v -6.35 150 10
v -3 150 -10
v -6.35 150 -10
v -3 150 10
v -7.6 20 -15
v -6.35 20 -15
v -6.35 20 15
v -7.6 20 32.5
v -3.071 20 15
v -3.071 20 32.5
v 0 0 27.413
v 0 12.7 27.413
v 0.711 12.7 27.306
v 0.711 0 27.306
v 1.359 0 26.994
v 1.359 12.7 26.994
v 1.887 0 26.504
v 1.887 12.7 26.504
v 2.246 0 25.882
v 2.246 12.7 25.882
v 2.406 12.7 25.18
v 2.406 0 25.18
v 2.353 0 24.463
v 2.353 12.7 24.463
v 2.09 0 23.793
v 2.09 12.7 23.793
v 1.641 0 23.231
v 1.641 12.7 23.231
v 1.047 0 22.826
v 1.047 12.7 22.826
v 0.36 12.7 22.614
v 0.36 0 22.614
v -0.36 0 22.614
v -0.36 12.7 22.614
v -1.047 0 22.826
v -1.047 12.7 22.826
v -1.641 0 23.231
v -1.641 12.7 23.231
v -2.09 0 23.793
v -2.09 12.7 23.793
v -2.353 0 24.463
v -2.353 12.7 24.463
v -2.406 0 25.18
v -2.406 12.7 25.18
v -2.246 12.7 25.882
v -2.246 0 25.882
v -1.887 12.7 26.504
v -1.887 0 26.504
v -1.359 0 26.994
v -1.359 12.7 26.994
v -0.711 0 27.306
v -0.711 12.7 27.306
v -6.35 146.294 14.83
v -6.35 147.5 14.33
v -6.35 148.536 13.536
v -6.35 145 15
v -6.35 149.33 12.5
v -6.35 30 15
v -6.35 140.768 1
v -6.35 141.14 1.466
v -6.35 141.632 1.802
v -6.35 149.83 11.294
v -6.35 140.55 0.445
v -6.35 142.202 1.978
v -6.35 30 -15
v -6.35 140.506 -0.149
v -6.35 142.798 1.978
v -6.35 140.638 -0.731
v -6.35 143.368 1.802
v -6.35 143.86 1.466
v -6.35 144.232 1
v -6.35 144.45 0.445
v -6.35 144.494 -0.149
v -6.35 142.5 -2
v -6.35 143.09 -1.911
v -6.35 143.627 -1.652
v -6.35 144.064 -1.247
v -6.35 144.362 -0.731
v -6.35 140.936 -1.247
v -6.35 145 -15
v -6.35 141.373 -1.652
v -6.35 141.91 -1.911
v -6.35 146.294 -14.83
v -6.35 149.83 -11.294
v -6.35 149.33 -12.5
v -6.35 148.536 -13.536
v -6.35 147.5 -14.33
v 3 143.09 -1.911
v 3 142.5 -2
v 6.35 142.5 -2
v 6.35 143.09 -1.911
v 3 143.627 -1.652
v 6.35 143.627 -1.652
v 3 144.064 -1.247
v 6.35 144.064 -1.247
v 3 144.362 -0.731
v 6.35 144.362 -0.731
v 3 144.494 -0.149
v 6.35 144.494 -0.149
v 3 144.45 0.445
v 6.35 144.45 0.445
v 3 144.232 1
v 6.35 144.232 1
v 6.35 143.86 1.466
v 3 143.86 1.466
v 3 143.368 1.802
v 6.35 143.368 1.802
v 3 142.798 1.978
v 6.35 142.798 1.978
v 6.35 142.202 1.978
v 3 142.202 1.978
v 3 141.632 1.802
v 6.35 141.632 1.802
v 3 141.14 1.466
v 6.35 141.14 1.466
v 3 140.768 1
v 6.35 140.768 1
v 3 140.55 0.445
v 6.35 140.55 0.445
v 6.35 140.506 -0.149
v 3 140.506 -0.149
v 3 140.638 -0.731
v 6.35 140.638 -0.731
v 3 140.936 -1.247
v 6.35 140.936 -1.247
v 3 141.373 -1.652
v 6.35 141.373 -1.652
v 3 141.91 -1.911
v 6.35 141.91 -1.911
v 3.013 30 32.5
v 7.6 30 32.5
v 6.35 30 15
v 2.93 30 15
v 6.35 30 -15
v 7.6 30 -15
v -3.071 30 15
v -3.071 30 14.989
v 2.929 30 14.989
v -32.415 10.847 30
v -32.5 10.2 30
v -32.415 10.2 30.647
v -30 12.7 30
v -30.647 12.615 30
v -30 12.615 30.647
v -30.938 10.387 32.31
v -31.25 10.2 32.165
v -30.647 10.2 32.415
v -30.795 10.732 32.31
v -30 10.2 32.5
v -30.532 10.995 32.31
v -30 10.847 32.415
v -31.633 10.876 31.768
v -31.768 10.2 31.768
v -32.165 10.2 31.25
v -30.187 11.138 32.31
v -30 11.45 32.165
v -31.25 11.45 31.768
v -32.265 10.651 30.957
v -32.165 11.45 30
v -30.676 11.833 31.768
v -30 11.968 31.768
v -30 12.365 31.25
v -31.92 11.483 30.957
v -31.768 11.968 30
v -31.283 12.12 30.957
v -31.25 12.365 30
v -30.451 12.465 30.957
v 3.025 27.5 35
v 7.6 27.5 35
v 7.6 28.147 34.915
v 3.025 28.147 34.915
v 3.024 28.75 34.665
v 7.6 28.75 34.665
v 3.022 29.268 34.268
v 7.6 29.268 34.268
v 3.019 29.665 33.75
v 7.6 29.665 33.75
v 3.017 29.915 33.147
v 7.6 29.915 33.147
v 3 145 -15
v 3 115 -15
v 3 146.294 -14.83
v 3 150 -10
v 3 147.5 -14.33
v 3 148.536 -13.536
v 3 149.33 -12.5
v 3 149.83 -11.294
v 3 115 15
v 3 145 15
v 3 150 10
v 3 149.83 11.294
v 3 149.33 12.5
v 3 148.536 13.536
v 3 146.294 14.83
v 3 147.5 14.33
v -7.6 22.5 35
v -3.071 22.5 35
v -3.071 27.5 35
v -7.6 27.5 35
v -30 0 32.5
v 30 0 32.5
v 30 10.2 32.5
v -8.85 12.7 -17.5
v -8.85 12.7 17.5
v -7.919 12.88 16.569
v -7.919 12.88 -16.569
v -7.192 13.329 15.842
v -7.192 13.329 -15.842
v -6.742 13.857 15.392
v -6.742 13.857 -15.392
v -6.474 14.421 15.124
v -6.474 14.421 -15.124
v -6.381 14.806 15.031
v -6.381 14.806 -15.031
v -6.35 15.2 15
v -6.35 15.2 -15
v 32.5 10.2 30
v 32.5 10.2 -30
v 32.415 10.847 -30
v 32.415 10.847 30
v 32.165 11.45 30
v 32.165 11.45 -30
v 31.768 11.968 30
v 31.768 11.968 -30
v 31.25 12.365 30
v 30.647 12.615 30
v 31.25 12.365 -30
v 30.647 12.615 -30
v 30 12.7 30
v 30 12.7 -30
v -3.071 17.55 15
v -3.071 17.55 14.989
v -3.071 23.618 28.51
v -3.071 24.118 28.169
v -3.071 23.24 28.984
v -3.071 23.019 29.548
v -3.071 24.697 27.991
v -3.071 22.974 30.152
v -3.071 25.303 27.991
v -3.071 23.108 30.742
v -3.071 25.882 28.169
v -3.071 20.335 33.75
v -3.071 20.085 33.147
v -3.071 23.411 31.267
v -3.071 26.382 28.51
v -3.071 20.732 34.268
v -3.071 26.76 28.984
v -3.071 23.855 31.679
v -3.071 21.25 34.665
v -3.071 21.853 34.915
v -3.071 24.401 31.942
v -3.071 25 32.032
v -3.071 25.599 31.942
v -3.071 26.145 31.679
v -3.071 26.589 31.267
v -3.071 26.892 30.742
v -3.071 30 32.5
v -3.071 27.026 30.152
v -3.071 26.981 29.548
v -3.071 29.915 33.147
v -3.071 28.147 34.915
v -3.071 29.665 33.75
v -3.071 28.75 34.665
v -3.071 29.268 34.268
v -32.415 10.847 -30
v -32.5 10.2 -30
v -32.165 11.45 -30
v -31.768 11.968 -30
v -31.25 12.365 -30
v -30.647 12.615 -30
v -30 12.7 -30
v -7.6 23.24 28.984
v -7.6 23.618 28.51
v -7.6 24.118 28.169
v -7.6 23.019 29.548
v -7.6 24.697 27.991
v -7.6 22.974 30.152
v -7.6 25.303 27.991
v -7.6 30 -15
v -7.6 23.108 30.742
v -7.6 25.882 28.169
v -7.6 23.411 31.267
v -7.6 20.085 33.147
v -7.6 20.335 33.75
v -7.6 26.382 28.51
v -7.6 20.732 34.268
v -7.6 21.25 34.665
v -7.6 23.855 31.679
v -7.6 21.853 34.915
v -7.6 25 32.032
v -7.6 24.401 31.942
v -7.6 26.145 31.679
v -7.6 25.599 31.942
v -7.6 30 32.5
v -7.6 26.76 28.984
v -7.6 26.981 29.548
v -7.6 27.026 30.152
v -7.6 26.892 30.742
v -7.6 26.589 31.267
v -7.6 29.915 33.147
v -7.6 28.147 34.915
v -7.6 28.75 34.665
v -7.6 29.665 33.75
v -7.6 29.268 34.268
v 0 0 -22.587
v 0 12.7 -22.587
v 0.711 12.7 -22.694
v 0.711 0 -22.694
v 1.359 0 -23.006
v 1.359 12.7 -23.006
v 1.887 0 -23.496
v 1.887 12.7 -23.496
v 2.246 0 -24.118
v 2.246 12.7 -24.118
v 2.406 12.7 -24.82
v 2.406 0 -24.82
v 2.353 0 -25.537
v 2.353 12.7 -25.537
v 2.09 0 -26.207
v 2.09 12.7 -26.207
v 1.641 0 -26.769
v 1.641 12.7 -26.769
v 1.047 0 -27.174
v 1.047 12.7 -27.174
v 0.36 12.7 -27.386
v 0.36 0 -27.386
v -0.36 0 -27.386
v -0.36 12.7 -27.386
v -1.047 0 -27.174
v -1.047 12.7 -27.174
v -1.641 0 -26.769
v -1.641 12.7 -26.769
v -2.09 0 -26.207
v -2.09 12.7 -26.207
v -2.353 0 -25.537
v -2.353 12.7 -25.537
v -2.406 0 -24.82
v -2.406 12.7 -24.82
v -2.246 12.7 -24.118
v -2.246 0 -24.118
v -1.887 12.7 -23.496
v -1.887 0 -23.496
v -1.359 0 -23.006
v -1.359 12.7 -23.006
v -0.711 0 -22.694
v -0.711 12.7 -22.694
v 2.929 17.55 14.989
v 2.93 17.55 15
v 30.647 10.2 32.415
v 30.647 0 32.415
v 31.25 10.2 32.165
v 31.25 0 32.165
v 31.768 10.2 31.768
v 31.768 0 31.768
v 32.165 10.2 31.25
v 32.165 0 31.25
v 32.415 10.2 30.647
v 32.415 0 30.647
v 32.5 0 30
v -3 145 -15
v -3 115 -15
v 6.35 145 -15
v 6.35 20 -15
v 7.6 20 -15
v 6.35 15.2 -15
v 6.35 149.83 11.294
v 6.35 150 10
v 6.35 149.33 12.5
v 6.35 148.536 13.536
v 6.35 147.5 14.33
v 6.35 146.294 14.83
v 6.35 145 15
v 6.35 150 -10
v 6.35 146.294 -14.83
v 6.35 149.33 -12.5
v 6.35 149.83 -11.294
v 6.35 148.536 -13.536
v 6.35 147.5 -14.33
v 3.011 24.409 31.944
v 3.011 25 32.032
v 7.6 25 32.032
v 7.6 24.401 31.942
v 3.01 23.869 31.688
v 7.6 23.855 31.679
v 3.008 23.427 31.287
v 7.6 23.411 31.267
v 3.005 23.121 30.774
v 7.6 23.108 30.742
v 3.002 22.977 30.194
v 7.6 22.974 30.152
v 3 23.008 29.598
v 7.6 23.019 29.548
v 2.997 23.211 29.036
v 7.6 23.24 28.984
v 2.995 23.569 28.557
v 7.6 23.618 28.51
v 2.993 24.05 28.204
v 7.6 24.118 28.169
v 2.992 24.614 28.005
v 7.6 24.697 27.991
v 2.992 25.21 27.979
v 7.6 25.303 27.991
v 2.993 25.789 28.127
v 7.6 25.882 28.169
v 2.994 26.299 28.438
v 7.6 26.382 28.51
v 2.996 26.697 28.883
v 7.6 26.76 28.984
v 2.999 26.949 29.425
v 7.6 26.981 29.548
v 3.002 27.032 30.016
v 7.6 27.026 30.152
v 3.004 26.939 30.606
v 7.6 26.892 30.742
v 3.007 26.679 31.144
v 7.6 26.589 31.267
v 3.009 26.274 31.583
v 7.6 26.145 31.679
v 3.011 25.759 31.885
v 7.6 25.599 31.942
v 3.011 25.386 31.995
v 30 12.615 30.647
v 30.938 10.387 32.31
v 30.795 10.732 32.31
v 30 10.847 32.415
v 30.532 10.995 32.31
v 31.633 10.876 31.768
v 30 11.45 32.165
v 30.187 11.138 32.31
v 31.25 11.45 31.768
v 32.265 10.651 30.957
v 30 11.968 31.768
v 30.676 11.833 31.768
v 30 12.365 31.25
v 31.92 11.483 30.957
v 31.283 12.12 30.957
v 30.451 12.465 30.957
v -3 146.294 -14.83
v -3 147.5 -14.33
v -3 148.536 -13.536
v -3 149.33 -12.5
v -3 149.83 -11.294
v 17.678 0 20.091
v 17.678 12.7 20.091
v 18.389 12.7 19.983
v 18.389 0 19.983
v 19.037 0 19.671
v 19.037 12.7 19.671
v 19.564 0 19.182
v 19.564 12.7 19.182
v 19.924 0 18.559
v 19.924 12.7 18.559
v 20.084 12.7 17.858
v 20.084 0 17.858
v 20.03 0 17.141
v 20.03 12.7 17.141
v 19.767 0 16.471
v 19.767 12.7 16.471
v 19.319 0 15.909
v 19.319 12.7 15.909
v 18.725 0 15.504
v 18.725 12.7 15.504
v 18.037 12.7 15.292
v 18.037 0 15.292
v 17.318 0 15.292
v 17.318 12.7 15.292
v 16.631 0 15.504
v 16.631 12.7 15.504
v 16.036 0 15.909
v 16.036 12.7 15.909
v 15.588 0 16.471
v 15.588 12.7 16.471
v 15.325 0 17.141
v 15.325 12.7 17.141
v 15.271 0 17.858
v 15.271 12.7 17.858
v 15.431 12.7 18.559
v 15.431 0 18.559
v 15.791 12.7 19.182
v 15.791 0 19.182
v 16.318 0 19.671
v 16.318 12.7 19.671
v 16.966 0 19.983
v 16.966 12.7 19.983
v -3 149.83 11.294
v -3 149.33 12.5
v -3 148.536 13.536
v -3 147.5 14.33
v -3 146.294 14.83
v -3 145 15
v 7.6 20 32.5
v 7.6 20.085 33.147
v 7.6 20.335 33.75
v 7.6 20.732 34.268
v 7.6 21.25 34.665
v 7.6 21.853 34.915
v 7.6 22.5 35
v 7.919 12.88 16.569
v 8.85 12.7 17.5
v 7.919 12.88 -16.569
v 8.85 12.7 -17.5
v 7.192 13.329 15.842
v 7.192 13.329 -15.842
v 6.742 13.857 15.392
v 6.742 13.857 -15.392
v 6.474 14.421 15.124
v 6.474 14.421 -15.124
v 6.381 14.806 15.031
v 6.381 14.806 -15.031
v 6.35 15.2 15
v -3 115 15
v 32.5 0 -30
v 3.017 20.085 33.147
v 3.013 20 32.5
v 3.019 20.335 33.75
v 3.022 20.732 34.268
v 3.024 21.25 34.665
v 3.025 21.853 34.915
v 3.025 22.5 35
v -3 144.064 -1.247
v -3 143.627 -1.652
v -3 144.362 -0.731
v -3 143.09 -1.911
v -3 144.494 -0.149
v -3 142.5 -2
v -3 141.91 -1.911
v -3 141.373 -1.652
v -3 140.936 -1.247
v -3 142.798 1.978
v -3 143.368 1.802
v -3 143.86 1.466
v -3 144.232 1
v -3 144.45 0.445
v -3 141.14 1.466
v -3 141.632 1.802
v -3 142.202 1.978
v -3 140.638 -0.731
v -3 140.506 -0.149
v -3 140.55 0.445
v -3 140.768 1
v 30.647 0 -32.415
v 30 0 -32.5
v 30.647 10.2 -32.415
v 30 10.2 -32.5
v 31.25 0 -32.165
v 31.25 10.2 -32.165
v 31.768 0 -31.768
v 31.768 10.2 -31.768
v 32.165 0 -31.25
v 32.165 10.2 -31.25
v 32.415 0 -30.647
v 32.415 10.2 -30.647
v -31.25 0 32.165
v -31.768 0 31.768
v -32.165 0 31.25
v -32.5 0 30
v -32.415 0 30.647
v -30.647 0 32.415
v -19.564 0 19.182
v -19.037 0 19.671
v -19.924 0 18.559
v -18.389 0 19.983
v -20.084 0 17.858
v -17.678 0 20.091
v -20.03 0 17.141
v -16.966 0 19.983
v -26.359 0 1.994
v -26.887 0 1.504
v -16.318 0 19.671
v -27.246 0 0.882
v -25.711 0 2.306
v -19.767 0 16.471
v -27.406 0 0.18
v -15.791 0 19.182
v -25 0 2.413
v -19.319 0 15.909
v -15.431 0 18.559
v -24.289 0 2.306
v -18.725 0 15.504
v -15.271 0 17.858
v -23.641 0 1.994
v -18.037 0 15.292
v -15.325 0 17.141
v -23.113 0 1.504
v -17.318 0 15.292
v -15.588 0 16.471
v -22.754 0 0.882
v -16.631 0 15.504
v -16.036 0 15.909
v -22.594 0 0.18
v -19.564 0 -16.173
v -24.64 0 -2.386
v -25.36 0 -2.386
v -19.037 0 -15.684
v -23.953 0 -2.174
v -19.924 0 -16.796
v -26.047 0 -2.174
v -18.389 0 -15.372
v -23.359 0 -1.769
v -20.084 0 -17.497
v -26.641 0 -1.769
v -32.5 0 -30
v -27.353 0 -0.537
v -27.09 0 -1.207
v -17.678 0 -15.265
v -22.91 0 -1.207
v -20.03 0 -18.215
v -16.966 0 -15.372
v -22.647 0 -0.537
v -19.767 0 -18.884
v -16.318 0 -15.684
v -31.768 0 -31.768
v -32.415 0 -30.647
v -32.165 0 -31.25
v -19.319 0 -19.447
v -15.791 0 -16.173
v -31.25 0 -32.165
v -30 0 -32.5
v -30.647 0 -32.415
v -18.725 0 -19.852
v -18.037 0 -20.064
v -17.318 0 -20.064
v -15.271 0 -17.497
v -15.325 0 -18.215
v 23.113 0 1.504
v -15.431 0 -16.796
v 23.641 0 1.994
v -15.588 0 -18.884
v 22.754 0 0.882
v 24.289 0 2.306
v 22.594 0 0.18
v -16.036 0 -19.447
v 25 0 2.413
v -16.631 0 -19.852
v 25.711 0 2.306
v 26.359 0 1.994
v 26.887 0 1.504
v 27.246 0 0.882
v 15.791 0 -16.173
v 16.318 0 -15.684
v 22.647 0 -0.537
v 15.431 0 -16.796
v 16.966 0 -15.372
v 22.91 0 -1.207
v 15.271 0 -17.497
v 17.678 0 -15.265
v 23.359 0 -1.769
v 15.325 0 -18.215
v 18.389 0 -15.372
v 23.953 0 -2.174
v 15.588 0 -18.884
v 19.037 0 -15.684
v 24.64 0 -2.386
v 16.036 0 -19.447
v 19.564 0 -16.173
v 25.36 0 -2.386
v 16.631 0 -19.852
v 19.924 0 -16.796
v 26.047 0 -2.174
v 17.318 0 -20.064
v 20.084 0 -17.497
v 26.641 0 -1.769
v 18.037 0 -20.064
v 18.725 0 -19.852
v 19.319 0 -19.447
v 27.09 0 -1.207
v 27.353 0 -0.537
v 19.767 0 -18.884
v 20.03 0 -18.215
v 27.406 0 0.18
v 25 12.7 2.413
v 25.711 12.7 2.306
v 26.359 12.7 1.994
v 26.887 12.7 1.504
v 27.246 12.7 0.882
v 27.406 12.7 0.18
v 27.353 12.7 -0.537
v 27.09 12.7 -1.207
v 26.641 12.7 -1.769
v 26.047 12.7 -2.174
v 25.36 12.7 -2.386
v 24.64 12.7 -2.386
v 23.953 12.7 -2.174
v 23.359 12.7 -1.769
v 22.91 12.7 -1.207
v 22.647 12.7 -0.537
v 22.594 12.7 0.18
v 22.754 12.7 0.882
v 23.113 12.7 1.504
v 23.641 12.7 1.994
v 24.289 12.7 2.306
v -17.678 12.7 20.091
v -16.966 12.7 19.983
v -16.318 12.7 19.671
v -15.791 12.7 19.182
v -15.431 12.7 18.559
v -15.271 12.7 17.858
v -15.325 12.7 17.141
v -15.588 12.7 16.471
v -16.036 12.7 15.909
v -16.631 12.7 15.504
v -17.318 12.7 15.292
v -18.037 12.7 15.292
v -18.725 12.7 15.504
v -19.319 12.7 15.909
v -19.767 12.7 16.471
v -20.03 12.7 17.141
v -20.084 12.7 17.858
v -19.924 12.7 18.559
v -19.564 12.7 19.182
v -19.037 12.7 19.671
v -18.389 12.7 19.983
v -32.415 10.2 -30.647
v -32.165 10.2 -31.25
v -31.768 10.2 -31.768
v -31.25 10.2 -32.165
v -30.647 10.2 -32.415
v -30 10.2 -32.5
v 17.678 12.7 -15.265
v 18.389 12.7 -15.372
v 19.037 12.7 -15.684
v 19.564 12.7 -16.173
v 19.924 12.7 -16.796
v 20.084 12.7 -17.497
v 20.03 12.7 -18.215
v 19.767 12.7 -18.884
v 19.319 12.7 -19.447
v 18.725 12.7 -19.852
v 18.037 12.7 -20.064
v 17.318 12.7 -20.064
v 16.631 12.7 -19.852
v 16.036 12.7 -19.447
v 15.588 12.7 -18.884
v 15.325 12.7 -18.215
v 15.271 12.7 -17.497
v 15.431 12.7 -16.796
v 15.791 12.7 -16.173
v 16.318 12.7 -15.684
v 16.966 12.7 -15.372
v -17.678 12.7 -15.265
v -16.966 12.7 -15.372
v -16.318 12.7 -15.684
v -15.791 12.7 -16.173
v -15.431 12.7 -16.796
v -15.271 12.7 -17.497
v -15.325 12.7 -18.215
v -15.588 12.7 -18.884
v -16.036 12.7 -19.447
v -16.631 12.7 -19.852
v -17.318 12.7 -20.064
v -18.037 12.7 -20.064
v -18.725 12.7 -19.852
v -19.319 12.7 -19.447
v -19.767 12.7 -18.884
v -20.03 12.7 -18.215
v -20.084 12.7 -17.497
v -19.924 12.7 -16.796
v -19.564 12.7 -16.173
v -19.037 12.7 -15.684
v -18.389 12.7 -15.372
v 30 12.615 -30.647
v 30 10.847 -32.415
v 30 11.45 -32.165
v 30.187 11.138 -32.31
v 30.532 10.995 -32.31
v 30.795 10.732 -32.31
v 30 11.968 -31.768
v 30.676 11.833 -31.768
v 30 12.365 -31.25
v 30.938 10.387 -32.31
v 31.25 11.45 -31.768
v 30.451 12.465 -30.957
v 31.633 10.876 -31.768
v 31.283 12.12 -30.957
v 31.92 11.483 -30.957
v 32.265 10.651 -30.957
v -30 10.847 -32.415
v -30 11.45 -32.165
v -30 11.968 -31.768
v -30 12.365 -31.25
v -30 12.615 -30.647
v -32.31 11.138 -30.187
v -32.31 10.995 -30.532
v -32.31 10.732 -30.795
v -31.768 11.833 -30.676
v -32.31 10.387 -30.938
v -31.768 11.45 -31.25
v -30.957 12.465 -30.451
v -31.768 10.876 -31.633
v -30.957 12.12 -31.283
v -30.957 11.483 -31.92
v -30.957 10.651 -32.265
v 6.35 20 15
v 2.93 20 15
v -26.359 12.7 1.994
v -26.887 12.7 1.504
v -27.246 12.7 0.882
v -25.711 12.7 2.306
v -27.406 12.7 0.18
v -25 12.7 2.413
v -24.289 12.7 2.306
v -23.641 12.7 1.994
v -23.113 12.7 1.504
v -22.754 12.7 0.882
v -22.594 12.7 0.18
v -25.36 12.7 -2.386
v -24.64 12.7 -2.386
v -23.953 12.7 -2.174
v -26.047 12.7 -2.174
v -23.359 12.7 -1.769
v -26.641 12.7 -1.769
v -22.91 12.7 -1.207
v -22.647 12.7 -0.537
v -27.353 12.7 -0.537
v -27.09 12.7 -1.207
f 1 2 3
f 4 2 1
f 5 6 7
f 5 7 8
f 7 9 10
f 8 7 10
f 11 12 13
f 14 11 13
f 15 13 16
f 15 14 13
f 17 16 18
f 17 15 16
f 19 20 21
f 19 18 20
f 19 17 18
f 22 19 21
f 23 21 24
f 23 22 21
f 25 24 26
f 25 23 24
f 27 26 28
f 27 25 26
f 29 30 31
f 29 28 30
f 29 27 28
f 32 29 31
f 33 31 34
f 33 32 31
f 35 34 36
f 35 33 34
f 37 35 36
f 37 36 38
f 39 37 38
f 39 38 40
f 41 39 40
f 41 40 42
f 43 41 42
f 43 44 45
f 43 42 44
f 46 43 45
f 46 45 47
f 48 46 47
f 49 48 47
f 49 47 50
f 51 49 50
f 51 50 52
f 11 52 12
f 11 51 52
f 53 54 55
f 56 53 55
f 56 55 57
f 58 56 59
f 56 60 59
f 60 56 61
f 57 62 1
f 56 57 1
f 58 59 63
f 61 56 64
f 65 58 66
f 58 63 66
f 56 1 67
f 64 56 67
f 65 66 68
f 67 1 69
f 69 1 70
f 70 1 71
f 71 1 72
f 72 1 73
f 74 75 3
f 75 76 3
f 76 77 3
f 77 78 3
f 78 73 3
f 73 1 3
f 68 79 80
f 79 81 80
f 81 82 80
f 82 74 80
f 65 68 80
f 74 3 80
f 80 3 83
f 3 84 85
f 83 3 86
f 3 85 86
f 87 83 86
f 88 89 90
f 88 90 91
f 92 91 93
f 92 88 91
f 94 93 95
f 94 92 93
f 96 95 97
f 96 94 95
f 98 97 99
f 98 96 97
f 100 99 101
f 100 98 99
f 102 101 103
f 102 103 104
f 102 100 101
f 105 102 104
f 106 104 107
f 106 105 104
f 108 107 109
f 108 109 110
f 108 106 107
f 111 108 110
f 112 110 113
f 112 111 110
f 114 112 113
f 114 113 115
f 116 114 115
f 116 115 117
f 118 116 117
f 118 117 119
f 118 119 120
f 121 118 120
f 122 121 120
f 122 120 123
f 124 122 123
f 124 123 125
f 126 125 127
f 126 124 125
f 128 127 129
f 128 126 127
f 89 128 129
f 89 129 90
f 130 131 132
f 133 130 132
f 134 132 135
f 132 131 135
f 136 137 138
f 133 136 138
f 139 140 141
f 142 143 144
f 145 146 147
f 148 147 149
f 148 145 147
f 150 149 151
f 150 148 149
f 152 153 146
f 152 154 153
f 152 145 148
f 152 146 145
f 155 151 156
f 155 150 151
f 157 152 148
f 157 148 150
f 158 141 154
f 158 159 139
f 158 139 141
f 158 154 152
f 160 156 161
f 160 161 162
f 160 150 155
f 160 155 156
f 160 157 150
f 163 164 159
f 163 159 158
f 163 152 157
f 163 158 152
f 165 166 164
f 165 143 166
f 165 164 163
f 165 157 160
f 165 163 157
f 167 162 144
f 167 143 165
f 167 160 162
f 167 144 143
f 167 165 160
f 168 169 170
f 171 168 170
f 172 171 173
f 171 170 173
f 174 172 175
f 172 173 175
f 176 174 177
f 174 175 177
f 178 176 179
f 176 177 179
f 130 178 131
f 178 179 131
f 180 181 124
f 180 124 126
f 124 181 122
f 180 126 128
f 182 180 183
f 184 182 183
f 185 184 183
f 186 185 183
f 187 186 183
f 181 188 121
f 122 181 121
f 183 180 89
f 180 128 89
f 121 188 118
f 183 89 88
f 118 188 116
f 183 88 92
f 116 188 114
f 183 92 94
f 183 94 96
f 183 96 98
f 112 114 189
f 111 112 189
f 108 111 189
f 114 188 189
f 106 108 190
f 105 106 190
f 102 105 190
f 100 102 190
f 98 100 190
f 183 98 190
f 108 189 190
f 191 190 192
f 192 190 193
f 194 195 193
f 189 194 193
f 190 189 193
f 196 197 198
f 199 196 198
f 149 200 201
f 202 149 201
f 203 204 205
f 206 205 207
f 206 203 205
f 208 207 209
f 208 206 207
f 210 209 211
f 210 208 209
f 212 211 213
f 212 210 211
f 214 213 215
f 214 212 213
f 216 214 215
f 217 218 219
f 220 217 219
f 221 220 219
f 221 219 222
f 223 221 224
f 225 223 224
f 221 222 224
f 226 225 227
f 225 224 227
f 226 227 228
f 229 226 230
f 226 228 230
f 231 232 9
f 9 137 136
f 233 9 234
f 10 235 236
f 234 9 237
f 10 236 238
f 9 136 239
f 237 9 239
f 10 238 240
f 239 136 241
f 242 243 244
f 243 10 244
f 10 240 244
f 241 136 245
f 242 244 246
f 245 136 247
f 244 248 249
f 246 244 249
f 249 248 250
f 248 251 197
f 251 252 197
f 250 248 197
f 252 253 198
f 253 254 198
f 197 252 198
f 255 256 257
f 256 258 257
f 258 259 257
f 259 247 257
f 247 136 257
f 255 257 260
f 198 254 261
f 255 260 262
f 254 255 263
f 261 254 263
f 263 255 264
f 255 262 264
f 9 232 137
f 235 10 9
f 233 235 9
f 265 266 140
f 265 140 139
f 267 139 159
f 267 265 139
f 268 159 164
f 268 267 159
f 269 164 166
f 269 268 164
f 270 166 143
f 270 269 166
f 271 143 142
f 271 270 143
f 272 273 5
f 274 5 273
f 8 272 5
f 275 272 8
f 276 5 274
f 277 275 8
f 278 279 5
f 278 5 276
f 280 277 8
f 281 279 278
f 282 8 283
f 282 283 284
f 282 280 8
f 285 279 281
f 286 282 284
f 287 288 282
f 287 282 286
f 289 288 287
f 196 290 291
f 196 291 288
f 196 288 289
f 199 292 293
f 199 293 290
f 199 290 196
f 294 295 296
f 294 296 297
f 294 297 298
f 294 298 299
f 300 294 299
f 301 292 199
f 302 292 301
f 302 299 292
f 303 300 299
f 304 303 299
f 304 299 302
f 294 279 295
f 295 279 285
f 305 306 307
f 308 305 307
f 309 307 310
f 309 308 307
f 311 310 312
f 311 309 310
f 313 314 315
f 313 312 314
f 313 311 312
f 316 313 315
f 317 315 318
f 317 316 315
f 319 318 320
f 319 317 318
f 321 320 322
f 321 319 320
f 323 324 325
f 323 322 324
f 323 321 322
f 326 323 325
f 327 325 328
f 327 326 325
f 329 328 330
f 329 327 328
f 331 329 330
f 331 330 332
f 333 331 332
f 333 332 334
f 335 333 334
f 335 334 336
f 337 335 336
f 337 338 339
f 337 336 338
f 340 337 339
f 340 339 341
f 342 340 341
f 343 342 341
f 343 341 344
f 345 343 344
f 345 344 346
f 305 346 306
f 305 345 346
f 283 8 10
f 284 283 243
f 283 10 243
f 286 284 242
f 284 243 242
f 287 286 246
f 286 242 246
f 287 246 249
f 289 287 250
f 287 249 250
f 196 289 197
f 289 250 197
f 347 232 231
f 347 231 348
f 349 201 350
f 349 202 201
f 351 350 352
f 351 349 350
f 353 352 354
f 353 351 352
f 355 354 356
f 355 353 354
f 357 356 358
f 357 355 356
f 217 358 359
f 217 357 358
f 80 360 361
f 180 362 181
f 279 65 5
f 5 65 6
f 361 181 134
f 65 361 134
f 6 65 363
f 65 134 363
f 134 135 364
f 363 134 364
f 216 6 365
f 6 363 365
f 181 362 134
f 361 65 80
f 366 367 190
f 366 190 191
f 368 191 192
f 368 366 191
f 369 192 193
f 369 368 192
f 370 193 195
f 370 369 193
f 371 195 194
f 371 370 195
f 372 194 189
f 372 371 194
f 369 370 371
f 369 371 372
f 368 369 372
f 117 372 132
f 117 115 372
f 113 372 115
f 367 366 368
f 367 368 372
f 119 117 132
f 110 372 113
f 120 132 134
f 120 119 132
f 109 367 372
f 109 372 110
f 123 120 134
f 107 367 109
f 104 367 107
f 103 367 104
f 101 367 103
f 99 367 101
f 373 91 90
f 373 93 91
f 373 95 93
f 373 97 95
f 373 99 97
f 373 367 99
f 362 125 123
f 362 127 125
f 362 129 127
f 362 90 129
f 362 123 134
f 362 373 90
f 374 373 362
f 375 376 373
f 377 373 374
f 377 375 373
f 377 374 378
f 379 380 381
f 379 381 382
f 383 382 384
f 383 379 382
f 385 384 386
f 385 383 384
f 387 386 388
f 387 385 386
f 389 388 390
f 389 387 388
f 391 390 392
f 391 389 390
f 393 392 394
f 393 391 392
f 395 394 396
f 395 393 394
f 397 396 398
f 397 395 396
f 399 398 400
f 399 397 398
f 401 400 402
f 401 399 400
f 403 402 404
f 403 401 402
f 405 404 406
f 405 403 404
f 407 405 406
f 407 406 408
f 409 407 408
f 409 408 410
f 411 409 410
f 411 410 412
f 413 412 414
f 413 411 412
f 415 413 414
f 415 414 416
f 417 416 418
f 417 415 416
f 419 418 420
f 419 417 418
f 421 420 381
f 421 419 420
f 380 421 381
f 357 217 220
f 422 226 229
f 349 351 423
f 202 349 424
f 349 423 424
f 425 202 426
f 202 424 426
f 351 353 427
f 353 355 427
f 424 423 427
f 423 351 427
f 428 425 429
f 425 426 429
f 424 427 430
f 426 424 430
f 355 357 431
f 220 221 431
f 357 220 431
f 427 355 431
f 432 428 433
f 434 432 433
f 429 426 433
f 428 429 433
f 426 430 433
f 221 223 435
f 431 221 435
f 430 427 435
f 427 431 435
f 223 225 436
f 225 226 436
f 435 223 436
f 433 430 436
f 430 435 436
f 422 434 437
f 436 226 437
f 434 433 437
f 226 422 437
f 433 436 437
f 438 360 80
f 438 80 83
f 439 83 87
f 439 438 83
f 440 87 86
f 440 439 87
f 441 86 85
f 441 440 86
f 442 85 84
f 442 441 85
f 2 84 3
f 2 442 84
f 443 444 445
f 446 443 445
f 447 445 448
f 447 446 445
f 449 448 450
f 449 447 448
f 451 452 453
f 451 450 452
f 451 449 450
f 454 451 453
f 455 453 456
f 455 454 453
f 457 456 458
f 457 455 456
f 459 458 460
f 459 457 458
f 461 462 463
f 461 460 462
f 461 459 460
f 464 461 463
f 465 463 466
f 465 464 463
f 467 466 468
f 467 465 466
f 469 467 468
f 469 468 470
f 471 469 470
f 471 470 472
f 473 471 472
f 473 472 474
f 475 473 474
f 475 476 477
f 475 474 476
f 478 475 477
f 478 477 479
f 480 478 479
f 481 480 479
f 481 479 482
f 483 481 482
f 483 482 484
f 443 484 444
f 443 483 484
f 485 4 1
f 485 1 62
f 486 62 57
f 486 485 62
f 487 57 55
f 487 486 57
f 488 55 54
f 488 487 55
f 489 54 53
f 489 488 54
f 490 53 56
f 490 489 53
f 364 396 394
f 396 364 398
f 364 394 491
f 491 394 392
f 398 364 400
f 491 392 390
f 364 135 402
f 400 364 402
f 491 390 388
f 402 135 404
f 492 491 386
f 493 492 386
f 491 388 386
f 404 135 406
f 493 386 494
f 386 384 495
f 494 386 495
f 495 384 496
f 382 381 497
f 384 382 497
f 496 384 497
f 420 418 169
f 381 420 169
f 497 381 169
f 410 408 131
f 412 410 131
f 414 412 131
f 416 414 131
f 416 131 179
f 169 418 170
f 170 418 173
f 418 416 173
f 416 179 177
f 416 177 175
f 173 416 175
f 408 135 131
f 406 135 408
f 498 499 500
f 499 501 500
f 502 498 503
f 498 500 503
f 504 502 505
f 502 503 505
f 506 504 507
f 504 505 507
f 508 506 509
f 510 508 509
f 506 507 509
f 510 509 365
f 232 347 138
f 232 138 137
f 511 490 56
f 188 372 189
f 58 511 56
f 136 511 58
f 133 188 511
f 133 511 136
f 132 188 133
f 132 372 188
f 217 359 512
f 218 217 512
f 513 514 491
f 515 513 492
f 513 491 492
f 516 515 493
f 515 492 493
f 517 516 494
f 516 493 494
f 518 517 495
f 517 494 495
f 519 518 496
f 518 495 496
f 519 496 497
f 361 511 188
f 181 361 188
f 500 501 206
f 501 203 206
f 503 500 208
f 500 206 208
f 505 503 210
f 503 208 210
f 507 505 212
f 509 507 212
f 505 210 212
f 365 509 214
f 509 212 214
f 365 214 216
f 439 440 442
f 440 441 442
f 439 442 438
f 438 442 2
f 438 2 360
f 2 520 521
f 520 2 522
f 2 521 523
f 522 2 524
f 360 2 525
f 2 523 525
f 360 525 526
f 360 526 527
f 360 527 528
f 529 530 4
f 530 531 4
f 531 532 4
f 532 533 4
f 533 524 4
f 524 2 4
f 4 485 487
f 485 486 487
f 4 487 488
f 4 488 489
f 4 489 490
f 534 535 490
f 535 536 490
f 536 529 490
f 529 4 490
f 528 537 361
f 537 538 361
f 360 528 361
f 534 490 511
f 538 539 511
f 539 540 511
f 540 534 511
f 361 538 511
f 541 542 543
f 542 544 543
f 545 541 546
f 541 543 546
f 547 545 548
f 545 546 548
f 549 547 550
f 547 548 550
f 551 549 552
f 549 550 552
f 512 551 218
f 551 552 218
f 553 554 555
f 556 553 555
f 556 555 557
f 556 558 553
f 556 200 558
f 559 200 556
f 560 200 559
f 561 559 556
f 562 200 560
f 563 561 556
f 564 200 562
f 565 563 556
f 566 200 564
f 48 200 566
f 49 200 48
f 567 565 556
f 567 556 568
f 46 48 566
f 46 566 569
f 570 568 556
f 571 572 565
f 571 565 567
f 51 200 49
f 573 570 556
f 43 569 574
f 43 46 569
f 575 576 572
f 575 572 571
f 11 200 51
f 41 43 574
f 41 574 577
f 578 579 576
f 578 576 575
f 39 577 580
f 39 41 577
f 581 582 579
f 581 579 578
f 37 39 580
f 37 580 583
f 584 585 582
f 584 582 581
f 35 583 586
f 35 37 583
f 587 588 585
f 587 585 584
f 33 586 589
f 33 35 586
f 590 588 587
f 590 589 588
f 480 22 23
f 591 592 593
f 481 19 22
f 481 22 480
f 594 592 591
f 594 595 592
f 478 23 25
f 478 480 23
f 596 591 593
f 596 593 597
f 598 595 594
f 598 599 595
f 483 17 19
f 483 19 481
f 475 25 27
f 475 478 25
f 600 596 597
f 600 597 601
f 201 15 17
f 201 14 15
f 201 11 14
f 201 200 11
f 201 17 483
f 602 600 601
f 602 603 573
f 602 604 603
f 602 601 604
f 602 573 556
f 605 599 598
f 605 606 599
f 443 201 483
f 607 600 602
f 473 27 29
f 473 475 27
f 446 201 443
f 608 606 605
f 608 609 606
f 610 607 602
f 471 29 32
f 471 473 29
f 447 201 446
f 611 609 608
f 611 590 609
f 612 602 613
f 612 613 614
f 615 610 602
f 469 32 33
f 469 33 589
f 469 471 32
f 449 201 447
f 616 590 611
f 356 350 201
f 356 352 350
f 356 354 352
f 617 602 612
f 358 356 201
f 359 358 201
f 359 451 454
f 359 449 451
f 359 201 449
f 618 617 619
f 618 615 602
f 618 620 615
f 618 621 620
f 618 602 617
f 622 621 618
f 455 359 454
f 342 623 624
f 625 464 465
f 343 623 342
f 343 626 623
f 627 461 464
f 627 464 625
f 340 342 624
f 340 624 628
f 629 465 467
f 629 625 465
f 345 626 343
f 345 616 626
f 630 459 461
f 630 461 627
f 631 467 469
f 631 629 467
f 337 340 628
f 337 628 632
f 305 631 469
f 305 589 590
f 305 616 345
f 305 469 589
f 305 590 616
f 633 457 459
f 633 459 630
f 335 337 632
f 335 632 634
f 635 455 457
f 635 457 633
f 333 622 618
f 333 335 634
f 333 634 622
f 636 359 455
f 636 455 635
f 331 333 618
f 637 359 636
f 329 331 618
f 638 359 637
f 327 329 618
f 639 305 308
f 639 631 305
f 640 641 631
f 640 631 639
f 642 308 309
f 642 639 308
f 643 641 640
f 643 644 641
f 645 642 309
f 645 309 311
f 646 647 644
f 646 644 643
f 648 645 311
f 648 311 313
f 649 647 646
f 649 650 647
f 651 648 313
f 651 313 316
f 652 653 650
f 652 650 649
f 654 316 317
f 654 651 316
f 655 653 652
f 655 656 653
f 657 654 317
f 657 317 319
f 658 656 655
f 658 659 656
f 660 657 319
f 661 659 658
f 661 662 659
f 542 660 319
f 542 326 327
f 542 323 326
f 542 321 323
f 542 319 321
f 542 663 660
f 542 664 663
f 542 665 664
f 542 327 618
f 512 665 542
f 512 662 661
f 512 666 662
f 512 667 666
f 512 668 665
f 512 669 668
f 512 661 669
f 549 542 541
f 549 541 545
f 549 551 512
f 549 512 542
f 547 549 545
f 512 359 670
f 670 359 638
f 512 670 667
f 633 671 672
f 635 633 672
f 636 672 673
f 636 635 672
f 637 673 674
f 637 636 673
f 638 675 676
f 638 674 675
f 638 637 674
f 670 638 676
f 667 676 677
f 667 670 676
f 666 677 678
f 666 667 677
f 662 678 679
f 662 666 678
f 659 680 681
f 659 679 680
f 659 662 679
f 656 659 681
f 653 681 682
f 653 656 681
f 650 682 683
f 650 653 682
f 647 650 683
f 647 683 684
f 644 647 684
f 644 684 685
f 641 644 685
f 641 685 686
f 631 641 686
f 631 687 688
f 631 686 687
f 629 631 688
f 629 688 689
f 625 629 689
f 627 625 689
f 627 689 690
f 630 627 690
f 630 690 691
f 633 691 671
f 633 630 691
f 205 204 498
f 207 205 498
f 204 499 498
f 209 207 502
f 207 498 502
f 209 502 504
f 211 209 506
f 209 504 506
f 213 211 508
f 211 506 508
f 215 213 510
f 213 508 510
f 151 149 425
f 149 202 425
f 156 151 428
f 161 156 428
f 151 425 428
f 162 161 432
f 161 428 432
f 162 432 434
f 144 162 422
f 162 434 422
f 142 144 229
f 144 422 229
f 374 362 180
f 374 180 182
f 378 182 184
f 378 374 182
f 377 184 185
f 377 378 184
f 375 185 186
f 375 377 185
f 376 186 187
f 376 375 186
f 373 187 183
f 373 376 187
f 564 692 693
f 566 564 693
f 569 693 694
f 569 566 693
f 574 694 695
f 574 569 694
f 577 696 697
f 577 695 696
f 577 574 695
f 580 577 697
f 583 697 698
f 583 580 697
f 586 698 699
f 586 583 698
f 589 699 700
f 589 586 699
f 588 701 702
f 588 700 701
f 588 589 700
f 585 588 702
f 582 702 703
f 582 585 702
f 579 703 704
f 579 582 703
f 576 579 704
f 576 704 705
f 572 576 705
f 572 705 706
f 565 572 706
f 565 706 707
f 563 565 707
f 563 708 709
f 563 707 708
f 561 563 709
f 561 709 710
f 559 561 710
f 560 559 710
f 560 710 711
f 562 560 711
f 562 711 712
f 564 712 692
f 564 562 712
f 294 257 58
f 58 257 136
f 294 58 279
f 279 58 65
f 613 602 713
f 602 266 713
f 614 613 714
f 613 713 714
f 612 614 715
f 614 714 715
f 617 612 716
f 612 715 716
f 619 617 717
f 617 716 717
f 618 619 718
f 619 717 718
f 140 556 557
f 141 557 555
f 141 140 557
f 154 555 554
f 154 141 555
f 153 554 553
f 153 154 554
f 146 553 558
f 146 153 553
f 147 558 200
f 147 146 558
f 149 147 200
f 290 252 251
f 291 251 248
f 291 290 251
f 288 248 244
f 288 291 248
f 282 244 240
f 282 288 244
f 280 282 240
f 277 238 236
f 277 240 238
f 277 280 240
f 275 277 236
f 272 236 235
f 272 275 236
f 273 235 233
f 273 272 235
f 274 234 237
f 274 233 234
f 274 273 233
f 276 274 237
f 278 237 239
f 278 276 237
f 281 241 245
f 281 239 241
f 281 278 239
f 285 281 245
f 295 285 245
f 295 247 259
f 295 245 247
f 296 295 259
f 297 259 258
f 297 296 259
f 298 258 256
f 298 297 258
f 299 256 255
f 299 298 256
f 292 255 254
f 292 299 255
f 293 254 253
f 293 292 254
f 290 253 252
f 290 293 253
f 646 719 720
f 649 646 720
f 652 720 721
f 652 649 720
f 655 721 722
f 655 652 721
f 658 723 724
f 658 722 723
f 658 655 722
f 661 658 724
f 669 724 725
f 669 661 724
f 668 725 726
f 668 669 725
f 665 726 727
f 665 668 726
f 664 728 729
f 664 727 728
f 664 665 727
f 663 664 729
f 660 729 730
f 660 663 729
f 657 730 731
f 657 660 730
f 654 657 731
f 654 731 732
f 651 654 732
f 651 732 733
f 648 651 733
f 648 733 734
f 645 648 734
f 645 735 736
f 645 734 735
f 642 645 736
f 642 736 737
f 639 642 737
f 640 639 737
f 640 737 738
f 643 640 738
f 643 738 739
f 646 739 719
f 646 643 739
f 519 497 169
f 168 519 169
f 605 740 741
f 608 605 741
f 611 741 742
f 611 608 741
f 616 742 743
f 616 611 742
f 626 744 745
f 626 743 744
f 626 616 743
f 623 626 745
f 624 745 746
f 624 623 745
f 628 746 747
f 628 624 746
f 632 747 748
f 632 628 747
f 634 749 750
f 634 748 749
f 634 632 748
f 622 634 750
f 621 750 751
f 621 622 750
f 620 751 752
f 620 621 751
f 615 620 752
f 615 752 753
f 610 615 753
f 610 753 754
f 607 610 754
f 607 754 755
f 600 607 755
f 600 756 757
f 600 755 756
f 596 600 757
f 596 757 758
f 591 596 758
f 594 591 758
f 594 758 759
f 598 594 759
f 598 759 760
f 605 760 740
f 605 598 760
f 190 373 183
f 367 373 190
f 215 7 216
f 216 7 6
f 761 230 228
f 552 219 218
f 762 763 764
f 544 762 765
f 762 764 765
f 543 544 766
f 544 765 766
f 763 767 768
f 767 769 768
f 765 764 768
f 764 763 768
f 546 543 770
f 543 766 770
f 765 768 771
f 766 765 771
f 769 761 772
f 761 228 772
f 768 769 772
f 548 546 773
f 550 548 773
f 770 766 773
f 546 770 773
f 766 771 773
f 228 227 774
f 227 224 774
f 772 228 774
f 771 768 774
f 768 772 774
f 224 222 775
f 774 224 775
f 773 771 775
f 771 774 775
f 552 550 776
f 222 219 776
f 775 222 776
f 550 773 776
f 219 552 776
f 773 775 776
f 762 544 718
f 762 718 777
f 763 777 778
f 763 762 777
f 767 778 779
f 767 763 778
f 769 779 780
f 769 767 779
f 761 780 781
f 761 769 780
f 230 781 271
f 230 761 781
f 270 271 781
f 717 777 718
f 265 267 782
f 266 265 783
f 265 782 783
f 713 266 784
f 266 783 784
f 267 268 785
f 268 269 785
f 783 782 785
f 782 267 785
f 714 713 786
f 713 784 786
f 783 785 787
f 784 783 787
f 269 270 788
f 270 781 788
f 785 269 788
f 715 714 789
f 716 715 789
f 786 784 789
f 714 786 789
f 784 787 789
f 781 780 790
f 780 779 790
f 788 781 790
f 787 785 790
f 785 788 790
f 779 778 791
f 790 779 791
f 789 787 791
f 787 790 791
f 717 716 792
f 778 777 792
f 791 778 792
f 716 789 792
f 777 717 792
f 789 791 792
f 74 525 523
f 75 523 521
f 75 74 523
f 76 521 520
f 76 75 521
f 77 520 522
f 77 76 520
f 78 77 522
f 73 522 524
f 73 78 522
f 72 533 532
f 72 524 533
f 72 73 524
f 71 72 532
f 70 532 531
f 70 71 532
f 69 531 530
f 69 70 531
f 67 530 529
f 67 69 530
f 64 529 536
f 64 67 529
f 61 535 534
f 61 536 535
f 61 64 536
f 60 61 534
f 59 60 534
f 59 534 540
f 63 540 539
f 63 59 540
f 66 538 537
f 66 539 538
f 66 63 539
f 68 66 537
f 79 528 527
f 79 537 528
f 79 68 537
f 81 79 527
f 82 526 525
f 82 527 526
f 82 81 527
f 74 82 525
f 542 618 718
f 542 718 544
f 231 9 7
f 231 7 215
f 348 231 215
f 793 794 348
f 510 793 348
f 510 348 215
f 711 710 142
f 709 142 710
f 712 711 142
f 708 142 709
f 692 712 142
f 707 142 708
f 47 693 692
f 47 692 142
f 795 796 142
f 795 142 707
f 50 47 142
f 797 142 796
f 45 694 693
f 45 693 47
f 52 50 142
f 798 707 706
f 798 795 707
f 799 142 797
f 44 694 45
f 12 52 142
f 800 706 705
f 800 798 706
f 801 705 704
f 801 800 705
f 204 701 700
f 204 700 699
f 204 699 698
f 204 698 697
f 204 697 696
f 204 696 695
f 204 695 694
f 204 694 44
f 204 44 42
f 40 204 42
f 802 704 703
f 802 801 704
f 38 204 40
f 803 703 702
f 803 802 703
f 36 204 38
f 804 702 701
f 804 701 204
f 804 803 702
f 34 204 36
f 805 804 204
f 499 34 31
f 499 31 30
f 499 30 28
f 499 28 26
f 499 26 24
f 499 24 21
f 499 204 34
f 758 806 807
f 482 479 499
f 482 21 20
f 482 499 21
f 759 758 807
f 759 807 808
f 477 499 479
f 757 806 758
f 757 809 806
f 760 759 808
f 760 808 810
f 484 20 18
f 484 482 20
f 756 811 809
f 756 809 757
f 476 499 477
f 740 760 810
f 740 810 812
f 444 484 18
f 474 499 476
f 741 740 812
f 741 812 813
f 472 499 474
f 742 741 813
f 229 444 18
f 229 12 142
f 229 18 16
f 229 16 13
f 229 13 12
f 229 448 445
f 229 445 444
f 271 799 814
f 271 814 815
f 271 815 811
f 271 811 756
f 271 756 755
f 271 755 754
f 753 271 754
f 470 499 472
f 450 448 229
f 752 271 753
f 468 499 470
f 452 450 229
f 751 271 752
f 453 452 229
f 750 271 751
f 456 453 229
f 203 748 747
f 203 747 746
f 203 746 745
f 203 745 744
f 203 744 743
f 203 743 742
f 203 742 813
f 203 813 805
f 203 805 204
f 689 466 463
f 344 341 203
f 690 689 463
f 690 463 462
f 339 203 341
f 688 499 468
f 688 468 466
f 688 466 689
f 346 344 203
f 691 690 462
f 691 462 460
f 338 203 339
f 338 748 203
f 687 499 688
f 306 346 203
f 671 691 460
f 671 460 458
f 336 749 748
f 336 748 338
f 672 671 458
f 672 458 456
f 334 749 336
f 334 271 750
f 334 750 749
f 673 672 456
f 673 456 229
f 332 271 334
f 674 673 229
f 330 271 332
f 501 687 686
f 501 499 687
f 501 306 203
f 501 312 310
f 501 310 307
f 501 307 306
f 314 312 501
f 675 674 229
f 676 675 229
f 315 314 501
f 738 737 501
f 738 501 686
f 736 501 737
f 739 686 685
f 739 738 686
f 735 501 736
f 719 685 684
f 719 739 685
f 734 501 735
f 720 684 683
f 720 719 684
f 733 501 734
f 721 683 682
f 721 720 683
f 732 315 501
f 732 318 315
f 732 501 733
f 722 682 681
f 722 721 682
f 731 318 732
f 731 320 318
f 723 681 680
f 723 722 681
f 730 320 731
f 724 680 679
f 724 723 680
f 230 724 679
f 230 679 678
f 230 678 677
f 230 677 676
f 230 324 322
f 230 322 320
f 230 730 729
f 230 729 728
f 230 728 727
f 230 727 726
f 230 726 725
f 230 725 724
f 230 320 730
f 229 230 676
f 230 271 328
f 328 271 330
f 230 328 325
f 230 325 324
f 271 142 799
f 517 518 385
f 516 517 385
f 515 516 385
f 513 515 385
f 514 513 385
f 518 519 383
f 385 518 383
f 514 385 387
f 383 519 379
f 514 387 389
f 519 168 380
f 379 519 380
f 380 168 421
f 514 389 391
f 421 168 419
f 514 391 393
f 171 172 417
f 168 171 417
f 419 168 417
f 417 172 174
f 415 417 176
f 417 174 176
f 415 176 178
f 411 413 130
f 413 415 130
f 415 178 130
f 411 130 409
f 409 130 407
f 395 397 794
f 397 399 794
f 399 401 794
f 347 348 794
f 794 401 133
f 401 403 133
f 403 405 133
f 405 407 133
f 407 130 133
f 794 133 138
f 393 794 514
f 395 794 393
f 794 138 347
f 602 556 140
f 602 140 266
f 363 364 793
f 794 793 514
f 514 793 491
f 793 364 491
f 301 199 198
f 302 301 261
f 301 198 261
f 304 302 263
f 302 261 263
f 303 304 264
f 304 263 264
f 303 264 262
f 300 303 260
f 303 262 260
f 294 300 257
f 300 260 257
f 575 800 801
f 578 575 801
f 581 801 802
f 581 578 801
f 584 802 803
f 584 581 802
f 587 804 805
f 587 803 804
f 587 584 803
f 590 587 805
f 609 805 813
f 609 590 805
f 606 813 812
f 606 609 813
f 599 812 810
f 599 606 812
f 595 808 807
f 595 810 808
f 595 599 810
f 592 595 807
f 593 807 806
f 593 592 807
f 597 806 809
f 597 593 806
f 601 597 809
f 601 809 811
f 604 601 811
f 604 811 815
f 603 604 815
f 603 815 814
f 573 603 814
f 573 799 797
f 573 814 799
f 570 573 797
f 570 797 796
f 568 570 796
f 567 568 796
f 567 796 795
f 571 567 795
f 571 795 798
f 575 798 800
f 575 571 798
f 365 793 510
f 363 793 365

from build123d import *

# Parameters (mm, degrees)
SKETCH1_W               = 65
SKETCH1_H               = 65
BOSS_EXTRUDE1_DEPTH     = 12.7
SKETCH2_R               = 2
BOSS_EXTRUDE2_DEPTH     = 6.35
FILLET1_R               = 2.5
CUT_EXTRUDE2_DEPTH      = 157.883714897
CUT_EXTRUDE2_DEPTH_BACK = 12.7
SKETCH3_R               = 2.413
SKETCH4_R               = 2.032
BOSS_EXTRUDE4_DEPTH     = 7.6
CUT_EXTRUDE3_DEPTH      = 12.45
SKETCH6_W               = 6
SKETCH6_H               = 30
SKETCH6_H_2             = 5
CUT_EXTRUDE4_DEPTH      = 161.662690131


with BuildPart() as part:
    # Sketch1 → Boss-Extrude1 (new body)
    with BuildSketch(Plane(origin=(0, 0, 0), x_dir=(1, 0, 0), z_dir=(0, 1, 0))):
        Rectangle(SKETCH1_W, SKETCH1_H)
    extrude(amount=BOSS_EXTRUDE1_DEPTH)

    # Sketch2 → Boss-Extrude2 (add, symmetric)
    with BuildSketch(Plane(origin=(0, 0, 0), x_dir=(0, 0, -1), z_dir=(1, 0, 0))):
        with BuildLine():
            Line((-15, 0), (15, 0))
            Line((15, 0), (15, 145))
            ThreePointArc((15, 145), (13.535533906, 148.535533906), (10, 150))
            Line((10, 150), (-10, 150))
            ThreePointArc((-10, 150), (-13.535533906, 148.535533906), (-15, 145))
            Line((-15, 145), (-15, 0))
        make_face()
        with Locations((0, 142.5)):
            Circle(SKETCH2_R, mode=Mode.SUBTRACT)
    extrude(amount=BOSS_EXTRUDE2_DEPTH, both=True)

    # Fillet1
    fillet1_edges = [part.edges().sort_by_distance(p)[0] for p in [
        (32.5, 12.7, 0),
        (0, 12.7, -32.5),
        (-6.35, 12.7, 0),
        (0, 12.7, 15),
        (0, 12.7, -15),
        (6.35, 12.7, 0),
        (-32.5, 12.7, 0),
        (-32.5, 6.35, -32.5),
        (32.5, 6.35, -32.5),
        (32.5, 6.35, 32.5),
        (-32.5, 6.35, 32.5),
        (0, 12.7, 32.5),
    ]]
    fillet(fillet1_edges, radius=FILLET1_R)

    # Sketch3 → Cut-Extrude2 (cut, two sides: drawn at the far end of the back side and taken through both)
    with BuildSketch(Plane(origin=(0, 0, 0), x_dir=(1, 0, 0), z_dir=(0, 1, 0)).offset(-CUT_EXTRUDE2_DEPTH_BACK)):
        with Locations(Location((17.67766953, -17.67766953, 0), (0, 0, 270))):
            Circle(SKETCH3_R)
        with Locations(Location((25, 0, 0), (0, 0, 270))):
            Circle(SKETCH3_R)
        with Locations(Location((17.67766953, 17.67766953, 0), (0, 0, 270))):
            Circle(SKETCH3_R)
        with Locations(Location((0, 25, 0), (0, 0, 270))):
            Circle(SKETCH3_R)
        with Locations(Location((-17.67766953, 17.67766953, 0), (0, 0, 270))):
            Circle(SKETCH3_R)
        with Locations(Location((-25, 0, 0), (0, 0, 270))):
            Circle(SKETCH3_R)
        with Locations(Location((-17.67766953, -17.67766953, 0), (0, 0, 270))):
            Circle(SKETCH3_R)
        with Locations(Location((0, -25, 0), (0, 0, 270))):
            Circle(SKETCH3_R)
    extrude(amount=CUT_EXTRUDE2_DEPTH + CUT_EXTRUDE2_DEPTH_BACK, mode=Mode.SUBTRACT)

    # Sketch4 → Boss-Extrude4 (add, symmetric)
    with BuildSketch(Plane(origin=(0, 0, 0), x_dir=(0, 0, -1), z_dir=(1, 0, 0))):
        with BuildLine():
            Line((15, 20), (-32.5, 20))
            ThreePointArc((-32.5, 20), (-34.267766953, 20.732233047), (-35, 22.5))
            Line((-35, 22.5), (-35, 27.5))
            ThreePointArc((-35, 27.5), (-34.267766953, 29.267766953), (-32.5, 30))
            Line((-32.5, 30), (15, 30))
            Line((15, 30), (15, 20))
        make_face()
        with Locations(Location((-30, 25, 0), (0, 0, 180))):
            Circle(SKETCH4_R, mode=Mode.SUBTRACT)
    extrude(amount=BOSS_EXTRUDE4_DEPTH, both=True)

    # Sketch5 → Cut-Extrude3 (cut)
    with BuildSketch(Plane(origin=(0, 30, 0), x_dir=(1, 0, 0), z_dir=(0, 1, 0))):
        Polygon((-3.070505438, -14.989300838), (-3.070505438, -44.384490964), (3.070505438, -44.384490964), (2.929494562, -14.989300838), align=None)
    extrude(amount=-CUT_EXTRUDE3_DEPTH, mode=Mode.SUBTRACT)

    # Sketch6 → Cut-Extrude4 (cut, through all)
    with BuildSketch(Plane.XY.offset(15)):
        with Locations((0, 130)):
            Rectangle(SKETCH6_W, SKETCH6_H)
        with Locations((0, 147.5)):
            Rectangle(SKETCH6_W, SKETCH6_H_2)
    extrude(amount=-CUT_EXTRUDE4_DEPTH, mode=Mode.SUBTRACT)


solid = part.part
